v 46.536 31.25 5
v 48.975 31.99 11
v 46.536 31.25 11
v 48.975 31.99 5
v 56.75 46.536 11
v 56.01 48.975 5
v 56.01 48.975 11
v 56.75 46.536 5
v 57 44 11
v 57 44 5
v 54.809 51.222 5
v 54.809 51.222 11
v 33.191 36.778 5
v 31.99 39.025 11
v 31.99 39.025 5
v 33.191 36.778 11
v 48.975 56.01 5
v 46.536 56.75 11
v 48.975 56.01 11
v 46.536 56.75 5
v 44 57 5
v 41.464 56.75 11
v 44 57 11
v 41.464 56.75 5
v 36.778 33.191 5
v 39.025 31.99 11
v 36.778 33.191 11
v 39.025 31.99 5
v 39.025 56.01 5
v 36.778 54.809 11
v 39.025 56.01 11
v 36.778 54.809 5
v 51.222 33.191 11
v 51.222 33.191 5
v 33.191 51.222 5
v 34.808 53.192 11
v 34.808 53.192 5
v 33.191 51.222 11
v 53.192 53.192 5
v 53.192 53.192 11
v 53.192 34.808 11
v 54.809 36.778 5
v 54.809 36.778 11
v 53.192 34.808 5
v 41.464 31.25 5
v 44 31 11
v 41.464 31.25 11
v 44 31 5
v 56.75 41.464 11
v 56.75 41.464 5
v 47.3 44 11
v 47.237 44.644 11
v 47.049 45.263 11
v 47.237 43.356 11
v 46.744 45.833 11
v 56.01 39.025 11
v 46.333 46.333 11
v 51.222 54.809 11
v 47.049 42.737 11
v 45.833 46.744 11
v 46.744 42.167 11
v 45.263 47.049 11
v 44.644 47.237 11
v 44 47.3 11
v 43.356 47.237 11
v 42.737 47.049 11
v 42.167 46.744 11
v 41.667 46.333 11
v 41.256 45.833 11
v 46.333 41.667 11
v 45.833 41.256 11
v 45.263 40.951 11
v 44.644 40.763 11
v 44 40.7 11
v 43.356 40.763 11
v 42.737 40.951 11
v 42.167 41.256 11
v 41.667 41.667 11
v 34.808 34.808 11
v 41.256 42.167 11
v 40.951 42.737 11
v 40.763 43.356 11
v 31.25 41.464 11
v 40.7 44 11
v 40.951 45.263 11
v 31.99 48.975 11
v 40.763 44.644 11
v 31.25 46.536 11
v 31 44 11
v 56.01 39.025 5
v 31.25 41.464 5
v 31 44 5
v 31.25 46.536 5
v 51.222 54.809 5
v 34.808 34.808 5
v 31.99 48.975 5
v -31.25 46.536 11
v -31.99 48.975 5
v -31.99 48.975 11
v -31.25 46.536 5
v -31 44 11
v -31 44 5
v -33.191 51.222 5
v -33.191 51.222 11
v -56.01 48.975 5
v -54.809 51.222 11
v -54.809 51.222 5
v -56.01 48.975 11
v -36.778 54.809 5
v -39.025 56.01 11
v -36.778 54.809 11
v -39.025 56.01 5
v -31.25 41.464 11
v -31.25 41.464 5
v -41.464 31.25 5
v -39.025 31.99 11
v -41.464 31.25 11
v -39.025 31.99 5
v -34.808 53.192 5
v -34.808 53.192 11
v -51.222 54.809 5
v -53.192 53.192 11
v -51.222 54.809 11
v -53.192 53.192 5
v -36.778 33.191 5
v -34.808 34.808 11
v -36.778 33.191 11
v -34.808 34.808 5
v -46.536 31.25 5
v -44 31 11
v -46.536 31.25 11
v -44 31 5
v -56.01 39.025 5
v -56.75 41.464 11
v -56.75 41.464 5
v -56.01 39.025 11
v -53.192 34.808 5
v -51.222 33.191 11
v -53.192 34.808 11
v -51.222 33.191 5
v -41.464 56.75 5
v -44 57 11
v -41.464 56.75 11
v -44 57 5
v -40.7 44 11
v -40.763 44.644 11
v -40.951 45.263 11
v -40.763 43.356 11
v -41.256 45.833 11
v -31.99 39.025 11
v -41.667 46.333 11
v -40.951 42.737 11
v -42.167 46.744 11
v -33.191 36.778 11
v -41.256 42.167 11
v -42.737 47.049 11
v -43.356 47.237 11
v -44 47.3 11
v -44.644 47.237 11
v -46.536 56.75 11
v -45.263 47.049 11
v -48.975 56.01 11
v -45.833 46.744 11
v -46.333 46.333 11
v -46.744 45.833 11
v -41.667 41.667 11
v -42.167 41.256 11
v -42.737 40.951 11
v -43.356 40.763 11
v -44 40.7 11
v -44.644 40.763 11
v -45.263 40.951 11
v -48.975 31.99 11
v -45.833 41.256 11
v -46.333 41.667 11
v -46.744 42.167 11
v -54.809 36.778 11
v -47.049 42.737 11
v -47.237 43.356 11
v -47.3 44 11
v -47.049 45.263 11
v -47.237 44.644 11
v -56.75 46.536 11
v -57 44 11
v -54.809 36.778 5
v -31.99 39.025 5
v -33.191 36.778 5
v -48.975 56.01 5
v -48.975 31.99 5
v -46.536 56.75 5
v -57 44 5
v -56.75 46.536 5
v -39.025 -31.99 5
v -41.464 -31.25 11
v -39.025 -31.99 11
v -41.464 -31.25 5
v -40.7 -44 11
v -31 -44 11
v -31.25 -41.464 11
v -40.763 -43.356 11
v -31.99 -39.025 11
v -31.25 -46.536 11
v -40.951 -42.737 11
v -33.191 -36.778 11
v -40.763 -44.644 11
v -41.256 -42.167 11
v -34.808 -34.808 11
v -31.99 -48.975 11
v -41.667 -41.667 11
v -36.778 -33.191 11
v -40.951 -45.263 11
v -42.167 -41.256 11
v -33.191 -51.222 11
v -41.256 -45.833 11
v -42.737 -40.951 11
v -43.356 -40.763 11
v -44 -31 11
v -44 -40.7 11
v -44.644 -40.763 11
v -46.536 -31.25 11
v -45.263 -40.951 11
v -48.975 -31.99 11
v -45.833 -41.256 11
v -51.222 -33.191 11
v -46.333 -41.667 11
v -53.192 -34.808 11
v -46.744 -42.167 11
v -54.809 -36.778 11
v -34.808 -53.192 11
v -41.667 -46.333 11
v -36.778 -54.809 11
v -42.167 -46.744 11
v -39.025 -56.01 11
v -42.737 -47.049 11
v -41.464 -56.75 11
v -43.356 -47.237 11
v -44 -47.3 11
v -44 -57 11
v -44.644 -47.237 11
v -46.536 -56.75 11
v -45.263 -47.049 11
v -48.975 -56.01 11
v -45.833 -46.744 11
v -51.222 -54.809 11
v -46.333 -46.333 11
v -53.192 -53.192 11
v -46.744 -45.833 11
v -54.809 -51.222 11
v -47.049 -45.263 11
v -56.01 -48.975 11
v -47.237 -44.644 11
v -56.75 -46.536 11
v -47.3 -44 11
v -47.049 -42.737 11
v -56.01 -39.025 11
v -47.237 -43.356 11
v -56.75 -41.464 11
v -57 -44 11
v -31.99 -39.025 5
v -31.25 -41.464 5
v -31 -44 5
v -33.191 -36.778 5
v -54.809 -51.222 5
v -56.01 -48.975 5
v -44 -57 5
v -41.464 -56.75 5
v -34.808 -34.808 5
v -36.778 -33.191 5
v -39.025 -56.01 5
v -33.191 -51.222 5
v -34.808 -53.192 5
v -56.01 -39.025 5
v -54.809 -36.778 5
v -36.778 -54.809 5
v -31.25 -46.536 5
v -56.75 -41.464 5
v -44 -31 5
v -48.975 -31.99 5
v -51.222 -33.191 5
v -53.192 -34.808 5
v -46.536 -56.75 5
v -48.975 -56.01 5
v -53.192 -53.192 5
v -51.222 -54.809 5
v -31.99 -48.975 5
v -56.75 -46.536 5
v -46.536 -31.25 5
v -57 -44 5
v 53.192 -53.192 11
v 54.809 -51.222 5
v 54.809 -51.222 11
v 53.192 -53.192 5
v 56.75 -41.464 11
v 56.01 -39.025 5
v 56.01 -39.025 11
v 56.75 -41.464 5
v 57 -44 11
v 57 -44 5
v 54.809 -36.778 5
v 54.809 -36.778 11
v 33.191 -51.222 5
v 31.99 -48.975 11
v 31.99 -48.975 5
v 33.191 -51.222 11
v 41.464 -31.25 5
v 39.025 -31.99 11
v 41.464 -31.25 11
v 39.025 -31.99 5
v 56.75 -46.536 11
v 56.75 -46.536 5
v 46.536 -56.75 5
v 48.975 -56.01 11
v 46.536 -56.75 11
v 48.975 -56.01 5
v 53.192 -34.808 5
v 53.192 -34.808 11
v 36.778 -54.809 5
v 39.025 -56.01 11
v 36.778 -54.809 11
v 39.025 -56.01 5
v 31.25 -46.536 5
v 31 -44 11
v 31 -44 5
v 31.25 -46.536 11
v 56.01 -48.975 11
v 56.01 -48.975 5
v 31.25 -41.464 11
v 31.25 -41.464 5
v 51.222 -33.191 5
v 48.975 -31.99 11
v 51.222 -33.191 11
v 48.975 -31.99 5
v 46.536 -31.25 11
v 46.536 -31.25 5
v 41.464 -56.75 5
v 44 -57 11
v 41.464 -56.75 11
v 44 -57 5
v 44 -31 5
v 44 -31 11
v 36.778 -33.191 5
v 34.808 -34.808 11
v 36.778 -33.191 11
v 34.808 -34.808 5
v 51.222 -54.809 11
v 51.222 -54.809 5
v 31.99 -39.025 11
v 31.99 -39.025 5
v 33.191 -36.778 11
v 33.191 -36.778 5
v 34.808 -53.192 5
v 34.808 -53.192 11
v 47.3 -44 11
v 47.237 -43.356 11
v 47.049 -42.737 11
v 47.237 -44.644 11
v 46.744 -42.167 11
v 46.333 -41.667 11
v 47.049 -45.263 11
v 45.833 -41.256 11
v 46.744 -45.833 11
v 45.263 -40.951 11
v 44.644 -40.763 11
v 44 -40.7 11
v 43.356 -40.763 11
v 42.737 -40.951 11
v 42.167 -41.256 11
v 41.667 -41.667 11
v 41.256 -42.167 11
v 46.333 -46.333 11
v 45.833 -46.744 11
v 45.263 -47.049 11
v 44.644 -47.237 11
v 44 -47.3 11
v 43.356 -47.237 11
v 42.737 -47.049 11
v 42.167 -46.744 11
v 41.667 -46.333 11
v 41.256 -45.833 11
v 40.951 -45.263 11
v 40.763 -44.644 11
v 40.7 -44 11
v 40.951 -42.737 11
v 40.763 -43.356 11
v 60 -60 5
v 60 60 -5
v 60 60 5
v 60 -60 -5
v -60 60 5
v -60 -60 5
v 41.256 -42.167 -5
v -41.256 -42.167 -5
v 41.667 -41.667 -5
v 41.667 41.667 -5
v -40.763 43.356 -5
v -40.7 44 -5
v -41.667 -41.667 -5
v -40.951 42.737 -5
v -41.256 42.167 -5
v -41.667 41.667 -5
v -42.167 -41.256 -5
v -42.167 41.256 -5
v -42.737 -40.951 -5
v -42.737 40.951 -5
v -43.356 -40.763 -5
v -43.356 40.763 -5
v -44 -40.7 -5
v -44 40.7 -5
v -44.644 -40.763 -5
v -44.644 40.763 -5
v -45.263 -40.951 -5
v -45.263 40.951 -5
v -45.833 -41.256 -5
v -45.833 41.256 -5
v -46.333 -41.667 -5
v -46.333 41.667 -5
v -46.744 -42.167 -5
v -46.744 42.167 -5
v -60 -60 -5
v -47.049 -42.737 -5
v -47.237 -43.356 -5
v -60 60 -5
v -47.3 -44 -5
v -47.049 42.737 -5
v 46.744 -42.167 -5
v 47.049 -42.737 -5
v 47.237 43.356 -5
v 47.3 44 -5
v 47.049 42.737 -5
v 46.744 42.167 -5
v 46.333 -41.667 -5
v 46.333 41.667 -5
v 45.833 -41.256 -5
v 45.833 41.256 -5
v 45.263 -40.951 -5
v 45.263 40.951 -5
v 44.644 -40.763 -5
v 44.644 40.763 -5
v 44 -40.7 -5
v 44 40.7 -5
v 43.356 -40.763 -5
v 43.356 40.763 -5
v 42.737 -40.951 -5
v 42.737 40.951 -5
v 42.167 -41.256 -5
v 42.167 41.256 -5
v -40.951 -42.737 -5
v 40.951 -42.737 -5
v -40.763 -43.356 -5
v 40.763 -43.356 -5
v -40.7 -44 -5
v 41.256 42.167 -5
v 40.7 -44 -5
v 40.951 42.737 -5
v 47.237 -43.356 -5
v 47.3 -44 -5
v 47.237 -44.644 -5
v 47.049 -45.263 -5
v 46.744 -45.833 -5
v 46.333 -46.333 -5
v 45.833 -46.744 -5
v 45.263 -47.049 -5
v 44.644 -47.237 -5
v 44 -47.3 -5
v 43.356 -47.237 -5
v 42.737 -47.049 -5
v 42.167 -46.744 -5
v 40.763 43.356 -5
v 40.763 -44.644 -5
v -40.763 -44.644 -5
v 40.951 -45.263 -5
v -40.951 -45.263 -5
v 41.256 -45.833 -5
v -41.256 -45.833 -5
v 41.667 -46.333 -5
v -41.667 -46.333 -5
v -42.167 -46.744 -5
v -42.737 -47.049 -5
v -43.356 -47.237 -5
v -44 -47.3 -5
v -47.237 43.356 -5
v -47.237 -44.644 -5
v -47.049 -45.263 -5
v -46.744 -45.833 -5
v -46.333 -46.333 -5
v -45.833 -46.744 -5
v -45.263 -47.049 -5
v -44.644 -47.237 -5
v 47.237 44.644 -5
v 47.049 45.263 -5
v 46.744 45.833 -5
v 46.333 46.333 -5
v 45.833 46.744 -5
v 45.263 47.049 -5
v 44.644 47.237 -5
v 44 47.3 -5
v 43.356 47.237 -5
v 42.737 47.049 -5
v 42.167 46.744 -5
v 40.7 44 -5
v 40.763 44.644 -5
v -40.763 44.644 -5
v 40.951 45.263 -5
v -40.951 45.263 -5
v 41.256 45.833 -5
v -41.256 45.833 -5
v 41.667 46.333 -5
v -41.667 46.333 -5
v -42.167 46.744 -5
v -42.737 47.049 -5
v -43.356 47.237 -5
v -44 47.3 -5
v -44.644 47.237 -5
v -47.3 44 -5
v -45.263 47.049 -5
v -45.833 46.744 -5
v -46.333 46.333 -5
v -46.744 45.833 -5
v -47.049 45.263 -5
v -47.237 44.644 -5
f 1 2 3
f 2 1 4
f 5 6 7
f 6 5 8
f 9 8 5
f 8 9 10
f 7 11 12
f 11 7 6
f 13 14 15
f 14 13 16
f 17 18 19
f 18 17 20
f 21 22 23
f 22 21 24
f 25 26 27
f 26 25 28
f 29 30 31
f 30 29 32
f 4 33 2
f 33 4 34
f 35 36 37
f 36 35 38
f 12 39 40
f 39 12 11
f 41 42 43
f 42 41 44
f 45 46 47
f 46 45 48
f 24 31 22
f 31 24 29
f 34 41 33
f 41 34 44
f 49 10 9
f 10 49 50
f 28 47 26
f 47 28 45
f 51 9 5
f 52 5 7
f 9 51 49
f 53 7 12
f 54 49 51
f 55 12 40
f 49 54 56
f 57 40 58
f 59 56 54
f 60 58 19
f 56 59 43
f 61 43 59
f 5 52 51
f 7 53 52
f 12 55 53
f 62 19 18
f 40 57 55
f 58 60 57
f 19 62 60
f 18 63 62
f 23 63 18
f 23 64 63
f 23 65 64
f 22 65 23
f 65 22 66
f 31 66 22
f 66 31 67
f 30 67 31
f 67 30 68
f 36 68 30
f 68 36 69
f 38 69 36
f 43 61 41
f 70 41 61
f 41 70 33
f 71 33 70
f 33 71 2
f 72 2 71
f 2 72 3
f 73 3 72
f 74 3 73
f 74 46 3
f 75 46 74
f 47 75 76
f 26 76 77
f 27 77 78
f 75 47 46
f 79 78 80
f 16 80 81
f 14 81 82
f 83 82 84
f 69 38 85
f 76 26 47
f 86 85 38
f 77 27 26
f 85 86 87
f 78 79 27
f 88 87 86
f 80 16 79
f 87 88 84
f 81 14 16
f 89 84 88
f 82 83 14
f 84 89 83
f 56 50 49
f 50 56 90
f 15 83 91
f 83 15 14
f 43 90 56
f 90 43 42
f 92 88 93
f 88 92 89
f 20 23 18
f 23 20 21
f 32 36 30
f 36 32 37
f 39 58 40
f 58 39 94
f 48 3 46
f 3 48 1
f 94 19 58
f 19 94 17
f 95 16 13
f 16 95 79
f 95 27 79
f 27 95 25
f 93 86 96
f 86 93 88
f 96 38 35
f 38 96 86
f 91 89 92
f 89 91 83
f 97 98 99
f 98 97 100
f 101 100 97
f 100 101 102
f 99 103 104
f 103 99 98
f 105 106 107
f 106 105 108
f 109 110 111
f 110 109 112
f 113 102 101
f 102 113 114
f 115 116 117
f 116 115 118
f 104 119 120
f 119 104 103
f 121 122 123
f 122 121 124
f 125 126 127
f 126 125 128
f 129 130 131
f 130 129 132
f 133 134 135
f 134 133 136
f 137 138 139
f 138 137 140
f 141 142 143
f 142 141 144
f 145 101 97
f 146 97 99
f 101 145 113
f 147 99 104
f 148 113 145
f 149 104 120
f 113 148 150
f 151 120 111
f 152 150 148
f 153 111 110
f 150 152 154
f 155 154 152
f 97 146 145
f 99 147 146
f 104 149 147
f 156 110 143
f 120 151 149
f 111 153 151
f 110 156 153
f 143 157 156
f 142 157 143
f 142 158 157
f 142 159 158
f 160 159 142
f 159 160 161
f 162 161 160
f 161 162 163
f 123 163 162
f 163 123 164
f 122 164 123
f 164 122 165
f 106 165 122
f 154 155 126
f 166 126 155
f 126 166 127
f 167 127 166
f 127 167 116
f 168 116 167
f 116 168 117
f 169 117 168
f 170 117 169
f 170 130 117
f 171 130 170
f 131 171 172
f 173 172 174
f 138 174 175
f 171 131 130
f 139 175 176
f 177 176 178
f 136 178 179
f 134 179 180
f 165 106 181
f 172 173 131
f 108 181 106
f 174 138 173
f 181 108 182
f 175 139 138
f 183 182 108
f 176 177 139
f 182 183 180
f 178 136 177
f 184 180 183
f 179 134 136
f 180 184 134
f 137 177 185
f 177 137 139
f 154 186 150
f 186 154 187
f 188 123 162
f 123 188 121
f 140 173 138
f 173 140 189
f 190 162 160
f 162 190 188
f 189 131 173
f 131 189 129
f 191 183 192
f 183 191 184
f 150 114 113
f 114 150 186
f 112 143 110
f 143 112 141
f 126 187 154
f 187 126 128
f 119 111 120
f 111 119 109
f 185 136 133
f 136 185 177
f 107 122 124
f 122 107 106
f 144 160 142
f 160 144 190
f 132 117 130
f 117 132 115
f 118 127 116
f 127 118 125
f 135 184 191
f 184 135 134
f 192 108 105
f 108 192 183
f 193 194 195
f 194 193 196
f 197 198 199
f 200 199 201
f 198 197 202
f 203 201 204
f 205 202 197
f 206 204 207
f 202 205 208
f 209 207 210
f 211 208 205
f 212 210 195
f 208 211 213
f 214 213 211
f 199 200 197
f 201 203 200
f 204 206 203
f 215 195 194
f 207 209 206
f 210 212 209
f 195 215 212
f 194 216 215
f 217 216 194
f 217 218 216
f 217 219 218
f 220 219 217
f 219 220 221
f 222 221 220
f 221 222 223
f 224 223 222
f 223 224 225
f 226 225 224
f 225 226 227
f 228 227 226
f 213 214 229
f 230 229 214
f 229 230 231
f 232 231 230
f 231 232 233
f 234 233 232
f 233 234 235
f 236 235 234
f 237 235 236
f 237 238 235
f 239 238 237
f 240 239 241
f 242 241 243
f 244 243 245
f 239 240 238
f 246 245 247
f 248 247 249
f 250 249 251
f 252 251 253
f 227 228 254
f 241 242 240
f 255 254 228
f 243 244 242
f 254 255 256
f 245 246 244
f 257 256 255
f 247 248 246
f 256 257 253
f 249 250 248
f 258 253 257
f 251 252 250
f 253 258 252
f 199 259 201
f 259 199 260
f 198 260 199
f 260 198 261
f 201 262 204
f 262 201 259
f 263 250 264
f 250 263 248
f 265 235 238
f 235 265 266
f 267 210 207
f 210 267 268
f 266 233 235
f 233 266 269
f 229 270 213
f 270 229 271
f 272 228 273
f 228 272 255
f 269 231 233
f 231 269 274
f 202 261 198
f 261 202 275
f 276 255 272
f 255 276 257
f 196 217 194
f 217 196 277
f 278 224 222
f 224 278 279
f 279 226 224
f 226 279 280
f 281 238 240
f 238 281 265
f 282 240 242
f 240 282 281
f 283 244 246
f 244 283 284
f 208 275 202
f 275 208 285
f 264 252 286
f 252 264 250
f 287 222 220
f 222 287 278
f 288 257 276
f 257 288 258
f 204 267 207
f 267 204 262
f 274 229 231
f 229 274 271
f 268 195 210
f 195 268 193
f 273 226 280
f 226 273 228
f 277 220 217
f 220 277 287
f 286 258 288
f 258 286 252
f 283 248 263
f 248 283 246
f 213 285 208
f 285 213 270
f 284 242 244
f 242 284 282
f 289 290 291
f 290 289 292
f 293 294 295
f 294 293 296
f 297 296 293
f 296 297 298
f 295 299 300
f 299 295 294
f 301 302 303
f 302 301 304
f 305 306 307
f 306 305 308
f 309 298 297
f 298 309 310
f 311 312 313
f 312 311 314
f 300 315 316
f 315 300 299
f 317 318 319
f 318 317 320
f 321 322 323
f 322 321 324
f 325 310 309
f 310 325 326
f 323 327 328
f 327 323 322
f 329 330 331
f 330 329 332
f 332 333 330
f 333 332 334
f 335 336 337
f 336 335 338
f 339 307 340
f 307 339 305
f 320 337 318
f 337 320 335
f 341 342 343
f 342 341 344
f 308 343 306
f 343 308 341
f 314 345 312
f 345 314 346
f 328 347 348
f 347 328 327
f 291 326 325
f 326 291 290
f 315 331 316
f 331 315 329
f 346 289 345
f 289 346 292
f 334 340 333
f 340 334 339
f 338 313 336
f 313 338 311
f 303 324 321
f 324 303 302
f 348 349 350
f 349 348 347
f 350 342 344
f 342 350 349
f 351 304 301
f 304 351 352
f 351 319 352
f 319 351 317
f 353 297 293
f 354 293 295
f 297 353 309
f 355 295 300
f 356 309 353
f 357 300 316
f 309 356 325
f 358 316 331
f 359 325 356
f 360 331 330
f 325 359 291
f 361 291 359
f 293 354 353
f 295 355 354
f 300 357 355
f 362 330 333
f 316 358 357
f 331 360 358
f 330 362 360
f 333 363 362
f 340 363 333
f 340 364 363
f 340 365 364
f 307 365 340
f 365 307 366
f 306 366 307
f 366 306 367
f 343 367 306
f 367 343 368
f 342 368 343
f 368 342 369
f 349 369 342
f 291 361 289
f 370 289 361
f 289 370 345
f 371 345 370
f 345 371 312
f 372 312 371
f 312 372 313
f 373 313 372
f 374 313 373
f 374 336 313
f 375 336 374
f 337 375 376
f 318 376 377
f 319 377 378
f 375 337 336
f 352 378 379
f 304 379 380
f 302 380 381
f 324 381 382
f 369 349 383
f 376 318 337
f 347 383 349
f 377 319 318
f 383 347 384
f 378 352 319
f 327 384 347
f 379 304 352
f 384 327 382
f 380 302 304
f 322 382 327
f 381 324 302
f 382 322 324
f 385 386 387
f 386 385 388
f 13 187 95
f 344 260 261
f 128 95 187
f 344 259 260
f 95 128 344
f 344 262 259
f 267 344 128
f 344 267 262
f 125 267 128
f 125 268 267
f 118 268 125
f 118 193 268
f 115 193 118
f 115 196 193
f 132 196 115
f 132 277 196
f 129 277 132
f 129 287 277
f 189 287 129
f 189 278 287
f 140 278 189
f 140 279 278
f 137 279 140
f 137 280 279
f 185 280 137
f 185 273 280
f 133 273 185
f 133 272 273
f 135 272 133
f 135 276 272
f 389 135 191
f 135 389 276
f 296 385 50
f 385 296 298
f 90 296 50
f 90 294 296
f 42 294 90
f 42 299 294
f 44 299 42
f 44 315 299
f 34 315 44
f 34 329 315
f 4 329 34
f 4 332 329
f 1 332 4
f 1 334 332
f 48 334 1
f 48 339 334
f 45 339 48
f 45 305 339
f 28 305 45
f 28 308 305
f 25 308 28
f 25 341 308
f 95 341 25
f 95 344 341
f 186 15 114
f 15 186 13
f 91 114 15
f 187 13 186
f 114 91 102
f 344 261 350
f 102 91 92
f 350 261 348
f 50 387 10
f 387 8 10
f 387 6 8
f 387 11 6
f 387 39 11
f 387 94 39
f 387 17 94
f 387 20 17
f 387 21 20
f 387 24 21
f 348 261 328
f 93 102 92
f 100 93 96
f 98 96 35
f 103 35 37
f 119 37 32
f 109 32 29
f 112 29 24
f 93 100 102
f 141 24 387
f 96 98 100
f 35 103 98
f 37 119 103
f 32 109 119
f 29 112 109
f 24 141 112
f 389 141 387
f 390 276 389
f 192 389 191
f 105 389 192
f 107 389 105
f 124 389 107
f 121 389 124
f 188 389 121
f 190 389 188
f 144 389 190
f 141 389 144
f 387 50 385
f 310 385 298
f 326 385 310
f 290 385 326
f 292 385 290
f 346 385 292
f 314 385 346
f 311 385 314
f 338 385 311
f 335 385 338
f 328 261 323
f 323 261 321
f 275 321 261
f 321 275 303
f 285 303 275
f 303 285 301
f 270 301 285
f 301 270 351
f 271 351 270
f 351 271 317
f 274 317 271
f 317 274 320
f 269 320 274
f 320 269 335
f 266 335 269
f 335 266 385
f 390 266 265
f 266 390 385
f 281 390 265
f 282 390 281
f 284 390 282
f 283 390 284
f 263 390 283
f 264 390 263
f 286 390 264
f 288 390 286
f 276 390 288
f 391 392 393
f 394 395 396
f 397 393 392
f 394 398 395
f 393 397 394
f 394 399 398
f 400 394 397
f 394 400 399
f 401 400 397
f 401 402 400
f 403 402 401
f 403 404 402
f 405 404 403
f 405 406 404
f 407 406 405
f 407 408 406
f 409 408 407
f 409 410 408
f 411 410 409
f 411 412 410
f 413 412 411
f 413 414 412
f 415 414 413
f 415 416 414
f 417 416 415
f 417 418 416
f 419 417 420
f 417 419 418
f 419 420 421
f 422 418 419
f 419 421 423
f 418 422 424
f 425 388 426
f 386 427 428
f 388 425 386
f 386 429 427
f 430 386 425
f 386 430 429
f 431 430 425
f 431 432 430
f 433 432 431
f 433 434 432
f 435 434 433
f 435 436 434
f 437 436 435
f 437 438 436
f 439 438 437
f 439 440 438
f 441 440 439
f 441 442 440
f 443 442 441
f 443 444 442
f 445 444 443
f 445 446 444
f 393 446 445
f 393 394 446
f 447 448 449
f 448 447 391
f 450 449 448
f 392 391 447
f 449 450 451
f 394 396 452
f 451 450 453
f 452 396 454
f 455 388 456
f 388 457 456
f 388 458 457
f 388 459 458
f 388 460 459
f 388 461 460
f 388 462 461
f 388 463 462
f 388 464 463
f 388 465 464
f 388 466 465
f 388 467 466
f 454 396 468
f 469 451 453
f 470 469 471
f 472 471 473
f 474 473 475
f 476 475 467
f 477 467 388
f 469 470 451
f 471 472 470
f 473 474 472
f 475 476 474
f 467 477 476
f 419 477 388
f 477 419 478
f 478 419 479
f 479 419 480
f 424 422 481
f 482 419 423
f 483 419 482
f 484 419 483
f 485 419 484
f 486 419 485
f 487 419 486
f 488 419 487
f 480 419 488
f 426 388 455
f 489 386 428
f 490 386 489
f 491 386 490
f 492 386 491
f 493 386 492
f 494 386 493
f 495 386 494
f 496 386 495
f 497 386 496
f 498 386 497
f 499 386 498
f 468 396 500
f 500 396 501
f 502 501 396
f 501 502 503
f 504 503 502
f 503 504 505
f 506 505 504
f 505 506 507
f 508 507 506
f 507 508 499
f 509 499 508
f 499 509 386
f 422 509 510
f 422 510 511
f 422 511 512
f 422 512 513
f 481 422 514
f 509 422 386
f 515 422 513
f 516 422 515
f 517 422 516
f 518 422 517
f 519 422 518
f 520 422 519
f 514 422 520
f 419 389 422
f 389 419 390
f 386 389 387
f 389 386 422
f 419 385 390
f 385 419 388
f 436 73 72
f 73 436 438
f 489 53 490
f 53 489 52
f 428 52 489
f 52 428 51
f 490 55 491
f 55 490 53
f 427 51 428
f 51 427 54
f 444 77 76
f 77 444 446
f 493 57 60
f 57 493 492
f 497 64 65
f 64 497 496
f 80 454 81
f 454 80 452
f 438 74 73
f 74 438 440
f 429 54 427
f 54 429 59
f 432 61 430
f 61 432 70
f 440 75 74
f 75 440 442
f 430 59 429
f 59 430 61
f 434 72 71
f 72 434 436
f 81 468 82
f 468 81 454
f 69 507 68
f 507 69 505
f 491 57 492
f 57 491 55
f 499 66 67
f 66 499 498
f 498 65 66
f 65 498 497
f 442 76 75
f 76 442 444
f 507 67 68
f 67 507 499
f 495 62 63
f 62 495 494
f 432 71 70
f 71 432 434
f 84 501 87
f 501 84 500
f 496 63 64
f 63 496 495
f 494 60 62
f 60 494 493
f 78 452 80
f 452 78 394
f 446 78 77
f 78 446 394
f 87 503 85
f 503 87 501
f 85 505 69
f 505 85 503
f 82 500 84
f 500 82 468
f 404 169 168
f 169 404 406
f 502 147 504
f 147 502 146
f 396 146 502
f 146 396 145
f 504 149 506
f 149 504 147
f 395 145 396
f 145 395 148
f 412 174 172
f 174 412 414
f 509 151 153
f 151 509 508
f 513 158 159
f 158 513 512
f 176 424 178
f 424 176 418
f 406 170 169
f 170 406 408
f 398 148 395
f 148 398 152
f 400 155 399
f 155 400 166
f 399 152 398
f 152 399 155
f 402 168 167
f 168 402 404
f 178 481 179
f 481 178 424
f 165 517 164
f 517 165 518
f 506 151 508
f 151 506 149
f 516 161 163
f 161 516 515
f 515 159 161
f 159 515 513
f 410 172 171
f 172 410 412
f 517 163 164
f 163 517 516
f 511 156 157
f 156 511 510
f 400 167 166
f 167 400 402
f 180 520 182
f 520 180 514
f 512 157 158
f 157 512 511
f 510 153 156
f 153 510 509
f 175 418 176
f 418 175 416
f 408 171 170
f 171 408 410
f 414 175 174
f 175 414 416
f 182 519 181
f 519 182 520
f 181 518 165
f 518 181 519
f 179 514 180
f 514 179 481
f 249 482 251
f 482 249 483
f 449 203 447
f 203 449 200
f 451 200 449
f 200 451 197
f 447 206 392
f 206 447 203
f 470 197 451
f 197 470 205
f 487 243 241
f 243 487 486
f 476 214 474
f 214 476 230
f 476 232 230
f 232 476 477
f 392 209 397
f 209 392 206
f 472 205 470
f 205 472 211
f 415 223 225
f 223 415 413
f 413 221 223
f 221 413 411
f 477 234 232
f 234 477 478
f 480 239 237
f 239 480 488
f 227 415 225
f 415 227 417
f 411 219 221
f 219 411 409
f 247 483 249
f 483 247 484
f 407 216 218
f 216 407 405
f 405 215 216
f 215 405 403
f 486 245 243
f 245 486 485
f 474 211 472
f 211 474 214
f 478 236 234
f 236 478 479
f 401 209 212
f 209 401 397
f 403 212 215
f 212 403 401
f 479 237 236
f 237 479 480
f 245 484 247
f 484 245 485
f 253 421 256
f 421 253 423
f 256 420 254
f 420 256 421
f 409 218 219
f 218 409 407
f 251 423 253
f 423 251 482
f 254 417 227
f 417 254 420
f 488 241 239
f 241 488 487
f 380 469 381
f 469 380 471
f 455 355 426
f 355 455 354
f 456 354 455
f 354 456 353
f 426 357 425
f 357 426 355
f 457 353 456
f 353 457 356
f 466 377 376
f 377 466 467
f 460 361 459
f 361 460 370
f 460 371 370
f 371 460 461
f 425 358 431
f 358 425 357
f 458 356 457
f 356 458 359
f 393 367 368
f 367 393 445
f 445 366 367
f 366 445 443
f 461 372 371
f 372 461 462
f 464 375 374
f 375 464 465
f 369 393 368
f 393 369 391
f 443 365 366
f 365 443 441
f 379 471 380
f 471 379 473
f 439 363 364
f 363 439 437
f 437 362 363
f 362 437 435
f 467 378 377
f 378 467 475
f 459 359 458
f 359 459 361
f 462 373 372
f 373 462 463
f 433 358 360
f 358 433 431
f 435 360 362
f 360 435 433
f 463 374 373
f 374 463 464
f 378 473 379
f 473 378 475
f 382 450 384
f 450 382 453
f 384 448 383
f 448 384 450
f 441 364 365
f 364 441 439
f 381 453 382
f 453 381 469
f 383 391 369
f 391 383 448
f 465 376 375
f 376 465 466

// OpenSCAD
$fn = 32;

// ----------------------------------------------------------------------
// Anchor pads 120 x 120 x 16
// four corner bosses with anchor holes
// ----------------------------------------------------------------------

// --- parameters (mm) ---
plate = [120, 120, 10];  // base plate size (x, y, z)
pads = 4;                // boss count, one per corner
edge = 16;               // boss centre offset from the plate edge
boss_d = 26;             // boss diameter
boss_h = 6;              // boss height above the base plate
hole_d = 6.6;            // hole diameter

// --- derived feature positions (mm) ---
height = plate[2] + boss_h;      // = 16   overall height of the part
corner_x = plate[0] / 2 - edge;  // = 44   boss centre X
corner_y = plate[1] / 2 - edge;  // = 44   boss centre Y
feature_centers = [
  [corner_x, corner_y],
  [-corner_x, corner_y],
  [-corner_x, -corner_y],
  [corner_x, -corner_y]
];   // boss centres, anchor holes are drilled there

// base plate, four bosses standing on it, anchor holes all the way through
difference() {
  union() {
    cube(plate, center = true);
    for (centre = feature_centers)
      translate([centre[0], centre[1], plate[2] / 2 - 1])
        cylinder(d = boss_d, h = boss_h + 1);
  }
  for (centre = feature_centers)
    translate([centre[0], centre[1], -height])
      cylinder(d = hole_d, h = 2 * height + 2);  // through boss and plate
}
